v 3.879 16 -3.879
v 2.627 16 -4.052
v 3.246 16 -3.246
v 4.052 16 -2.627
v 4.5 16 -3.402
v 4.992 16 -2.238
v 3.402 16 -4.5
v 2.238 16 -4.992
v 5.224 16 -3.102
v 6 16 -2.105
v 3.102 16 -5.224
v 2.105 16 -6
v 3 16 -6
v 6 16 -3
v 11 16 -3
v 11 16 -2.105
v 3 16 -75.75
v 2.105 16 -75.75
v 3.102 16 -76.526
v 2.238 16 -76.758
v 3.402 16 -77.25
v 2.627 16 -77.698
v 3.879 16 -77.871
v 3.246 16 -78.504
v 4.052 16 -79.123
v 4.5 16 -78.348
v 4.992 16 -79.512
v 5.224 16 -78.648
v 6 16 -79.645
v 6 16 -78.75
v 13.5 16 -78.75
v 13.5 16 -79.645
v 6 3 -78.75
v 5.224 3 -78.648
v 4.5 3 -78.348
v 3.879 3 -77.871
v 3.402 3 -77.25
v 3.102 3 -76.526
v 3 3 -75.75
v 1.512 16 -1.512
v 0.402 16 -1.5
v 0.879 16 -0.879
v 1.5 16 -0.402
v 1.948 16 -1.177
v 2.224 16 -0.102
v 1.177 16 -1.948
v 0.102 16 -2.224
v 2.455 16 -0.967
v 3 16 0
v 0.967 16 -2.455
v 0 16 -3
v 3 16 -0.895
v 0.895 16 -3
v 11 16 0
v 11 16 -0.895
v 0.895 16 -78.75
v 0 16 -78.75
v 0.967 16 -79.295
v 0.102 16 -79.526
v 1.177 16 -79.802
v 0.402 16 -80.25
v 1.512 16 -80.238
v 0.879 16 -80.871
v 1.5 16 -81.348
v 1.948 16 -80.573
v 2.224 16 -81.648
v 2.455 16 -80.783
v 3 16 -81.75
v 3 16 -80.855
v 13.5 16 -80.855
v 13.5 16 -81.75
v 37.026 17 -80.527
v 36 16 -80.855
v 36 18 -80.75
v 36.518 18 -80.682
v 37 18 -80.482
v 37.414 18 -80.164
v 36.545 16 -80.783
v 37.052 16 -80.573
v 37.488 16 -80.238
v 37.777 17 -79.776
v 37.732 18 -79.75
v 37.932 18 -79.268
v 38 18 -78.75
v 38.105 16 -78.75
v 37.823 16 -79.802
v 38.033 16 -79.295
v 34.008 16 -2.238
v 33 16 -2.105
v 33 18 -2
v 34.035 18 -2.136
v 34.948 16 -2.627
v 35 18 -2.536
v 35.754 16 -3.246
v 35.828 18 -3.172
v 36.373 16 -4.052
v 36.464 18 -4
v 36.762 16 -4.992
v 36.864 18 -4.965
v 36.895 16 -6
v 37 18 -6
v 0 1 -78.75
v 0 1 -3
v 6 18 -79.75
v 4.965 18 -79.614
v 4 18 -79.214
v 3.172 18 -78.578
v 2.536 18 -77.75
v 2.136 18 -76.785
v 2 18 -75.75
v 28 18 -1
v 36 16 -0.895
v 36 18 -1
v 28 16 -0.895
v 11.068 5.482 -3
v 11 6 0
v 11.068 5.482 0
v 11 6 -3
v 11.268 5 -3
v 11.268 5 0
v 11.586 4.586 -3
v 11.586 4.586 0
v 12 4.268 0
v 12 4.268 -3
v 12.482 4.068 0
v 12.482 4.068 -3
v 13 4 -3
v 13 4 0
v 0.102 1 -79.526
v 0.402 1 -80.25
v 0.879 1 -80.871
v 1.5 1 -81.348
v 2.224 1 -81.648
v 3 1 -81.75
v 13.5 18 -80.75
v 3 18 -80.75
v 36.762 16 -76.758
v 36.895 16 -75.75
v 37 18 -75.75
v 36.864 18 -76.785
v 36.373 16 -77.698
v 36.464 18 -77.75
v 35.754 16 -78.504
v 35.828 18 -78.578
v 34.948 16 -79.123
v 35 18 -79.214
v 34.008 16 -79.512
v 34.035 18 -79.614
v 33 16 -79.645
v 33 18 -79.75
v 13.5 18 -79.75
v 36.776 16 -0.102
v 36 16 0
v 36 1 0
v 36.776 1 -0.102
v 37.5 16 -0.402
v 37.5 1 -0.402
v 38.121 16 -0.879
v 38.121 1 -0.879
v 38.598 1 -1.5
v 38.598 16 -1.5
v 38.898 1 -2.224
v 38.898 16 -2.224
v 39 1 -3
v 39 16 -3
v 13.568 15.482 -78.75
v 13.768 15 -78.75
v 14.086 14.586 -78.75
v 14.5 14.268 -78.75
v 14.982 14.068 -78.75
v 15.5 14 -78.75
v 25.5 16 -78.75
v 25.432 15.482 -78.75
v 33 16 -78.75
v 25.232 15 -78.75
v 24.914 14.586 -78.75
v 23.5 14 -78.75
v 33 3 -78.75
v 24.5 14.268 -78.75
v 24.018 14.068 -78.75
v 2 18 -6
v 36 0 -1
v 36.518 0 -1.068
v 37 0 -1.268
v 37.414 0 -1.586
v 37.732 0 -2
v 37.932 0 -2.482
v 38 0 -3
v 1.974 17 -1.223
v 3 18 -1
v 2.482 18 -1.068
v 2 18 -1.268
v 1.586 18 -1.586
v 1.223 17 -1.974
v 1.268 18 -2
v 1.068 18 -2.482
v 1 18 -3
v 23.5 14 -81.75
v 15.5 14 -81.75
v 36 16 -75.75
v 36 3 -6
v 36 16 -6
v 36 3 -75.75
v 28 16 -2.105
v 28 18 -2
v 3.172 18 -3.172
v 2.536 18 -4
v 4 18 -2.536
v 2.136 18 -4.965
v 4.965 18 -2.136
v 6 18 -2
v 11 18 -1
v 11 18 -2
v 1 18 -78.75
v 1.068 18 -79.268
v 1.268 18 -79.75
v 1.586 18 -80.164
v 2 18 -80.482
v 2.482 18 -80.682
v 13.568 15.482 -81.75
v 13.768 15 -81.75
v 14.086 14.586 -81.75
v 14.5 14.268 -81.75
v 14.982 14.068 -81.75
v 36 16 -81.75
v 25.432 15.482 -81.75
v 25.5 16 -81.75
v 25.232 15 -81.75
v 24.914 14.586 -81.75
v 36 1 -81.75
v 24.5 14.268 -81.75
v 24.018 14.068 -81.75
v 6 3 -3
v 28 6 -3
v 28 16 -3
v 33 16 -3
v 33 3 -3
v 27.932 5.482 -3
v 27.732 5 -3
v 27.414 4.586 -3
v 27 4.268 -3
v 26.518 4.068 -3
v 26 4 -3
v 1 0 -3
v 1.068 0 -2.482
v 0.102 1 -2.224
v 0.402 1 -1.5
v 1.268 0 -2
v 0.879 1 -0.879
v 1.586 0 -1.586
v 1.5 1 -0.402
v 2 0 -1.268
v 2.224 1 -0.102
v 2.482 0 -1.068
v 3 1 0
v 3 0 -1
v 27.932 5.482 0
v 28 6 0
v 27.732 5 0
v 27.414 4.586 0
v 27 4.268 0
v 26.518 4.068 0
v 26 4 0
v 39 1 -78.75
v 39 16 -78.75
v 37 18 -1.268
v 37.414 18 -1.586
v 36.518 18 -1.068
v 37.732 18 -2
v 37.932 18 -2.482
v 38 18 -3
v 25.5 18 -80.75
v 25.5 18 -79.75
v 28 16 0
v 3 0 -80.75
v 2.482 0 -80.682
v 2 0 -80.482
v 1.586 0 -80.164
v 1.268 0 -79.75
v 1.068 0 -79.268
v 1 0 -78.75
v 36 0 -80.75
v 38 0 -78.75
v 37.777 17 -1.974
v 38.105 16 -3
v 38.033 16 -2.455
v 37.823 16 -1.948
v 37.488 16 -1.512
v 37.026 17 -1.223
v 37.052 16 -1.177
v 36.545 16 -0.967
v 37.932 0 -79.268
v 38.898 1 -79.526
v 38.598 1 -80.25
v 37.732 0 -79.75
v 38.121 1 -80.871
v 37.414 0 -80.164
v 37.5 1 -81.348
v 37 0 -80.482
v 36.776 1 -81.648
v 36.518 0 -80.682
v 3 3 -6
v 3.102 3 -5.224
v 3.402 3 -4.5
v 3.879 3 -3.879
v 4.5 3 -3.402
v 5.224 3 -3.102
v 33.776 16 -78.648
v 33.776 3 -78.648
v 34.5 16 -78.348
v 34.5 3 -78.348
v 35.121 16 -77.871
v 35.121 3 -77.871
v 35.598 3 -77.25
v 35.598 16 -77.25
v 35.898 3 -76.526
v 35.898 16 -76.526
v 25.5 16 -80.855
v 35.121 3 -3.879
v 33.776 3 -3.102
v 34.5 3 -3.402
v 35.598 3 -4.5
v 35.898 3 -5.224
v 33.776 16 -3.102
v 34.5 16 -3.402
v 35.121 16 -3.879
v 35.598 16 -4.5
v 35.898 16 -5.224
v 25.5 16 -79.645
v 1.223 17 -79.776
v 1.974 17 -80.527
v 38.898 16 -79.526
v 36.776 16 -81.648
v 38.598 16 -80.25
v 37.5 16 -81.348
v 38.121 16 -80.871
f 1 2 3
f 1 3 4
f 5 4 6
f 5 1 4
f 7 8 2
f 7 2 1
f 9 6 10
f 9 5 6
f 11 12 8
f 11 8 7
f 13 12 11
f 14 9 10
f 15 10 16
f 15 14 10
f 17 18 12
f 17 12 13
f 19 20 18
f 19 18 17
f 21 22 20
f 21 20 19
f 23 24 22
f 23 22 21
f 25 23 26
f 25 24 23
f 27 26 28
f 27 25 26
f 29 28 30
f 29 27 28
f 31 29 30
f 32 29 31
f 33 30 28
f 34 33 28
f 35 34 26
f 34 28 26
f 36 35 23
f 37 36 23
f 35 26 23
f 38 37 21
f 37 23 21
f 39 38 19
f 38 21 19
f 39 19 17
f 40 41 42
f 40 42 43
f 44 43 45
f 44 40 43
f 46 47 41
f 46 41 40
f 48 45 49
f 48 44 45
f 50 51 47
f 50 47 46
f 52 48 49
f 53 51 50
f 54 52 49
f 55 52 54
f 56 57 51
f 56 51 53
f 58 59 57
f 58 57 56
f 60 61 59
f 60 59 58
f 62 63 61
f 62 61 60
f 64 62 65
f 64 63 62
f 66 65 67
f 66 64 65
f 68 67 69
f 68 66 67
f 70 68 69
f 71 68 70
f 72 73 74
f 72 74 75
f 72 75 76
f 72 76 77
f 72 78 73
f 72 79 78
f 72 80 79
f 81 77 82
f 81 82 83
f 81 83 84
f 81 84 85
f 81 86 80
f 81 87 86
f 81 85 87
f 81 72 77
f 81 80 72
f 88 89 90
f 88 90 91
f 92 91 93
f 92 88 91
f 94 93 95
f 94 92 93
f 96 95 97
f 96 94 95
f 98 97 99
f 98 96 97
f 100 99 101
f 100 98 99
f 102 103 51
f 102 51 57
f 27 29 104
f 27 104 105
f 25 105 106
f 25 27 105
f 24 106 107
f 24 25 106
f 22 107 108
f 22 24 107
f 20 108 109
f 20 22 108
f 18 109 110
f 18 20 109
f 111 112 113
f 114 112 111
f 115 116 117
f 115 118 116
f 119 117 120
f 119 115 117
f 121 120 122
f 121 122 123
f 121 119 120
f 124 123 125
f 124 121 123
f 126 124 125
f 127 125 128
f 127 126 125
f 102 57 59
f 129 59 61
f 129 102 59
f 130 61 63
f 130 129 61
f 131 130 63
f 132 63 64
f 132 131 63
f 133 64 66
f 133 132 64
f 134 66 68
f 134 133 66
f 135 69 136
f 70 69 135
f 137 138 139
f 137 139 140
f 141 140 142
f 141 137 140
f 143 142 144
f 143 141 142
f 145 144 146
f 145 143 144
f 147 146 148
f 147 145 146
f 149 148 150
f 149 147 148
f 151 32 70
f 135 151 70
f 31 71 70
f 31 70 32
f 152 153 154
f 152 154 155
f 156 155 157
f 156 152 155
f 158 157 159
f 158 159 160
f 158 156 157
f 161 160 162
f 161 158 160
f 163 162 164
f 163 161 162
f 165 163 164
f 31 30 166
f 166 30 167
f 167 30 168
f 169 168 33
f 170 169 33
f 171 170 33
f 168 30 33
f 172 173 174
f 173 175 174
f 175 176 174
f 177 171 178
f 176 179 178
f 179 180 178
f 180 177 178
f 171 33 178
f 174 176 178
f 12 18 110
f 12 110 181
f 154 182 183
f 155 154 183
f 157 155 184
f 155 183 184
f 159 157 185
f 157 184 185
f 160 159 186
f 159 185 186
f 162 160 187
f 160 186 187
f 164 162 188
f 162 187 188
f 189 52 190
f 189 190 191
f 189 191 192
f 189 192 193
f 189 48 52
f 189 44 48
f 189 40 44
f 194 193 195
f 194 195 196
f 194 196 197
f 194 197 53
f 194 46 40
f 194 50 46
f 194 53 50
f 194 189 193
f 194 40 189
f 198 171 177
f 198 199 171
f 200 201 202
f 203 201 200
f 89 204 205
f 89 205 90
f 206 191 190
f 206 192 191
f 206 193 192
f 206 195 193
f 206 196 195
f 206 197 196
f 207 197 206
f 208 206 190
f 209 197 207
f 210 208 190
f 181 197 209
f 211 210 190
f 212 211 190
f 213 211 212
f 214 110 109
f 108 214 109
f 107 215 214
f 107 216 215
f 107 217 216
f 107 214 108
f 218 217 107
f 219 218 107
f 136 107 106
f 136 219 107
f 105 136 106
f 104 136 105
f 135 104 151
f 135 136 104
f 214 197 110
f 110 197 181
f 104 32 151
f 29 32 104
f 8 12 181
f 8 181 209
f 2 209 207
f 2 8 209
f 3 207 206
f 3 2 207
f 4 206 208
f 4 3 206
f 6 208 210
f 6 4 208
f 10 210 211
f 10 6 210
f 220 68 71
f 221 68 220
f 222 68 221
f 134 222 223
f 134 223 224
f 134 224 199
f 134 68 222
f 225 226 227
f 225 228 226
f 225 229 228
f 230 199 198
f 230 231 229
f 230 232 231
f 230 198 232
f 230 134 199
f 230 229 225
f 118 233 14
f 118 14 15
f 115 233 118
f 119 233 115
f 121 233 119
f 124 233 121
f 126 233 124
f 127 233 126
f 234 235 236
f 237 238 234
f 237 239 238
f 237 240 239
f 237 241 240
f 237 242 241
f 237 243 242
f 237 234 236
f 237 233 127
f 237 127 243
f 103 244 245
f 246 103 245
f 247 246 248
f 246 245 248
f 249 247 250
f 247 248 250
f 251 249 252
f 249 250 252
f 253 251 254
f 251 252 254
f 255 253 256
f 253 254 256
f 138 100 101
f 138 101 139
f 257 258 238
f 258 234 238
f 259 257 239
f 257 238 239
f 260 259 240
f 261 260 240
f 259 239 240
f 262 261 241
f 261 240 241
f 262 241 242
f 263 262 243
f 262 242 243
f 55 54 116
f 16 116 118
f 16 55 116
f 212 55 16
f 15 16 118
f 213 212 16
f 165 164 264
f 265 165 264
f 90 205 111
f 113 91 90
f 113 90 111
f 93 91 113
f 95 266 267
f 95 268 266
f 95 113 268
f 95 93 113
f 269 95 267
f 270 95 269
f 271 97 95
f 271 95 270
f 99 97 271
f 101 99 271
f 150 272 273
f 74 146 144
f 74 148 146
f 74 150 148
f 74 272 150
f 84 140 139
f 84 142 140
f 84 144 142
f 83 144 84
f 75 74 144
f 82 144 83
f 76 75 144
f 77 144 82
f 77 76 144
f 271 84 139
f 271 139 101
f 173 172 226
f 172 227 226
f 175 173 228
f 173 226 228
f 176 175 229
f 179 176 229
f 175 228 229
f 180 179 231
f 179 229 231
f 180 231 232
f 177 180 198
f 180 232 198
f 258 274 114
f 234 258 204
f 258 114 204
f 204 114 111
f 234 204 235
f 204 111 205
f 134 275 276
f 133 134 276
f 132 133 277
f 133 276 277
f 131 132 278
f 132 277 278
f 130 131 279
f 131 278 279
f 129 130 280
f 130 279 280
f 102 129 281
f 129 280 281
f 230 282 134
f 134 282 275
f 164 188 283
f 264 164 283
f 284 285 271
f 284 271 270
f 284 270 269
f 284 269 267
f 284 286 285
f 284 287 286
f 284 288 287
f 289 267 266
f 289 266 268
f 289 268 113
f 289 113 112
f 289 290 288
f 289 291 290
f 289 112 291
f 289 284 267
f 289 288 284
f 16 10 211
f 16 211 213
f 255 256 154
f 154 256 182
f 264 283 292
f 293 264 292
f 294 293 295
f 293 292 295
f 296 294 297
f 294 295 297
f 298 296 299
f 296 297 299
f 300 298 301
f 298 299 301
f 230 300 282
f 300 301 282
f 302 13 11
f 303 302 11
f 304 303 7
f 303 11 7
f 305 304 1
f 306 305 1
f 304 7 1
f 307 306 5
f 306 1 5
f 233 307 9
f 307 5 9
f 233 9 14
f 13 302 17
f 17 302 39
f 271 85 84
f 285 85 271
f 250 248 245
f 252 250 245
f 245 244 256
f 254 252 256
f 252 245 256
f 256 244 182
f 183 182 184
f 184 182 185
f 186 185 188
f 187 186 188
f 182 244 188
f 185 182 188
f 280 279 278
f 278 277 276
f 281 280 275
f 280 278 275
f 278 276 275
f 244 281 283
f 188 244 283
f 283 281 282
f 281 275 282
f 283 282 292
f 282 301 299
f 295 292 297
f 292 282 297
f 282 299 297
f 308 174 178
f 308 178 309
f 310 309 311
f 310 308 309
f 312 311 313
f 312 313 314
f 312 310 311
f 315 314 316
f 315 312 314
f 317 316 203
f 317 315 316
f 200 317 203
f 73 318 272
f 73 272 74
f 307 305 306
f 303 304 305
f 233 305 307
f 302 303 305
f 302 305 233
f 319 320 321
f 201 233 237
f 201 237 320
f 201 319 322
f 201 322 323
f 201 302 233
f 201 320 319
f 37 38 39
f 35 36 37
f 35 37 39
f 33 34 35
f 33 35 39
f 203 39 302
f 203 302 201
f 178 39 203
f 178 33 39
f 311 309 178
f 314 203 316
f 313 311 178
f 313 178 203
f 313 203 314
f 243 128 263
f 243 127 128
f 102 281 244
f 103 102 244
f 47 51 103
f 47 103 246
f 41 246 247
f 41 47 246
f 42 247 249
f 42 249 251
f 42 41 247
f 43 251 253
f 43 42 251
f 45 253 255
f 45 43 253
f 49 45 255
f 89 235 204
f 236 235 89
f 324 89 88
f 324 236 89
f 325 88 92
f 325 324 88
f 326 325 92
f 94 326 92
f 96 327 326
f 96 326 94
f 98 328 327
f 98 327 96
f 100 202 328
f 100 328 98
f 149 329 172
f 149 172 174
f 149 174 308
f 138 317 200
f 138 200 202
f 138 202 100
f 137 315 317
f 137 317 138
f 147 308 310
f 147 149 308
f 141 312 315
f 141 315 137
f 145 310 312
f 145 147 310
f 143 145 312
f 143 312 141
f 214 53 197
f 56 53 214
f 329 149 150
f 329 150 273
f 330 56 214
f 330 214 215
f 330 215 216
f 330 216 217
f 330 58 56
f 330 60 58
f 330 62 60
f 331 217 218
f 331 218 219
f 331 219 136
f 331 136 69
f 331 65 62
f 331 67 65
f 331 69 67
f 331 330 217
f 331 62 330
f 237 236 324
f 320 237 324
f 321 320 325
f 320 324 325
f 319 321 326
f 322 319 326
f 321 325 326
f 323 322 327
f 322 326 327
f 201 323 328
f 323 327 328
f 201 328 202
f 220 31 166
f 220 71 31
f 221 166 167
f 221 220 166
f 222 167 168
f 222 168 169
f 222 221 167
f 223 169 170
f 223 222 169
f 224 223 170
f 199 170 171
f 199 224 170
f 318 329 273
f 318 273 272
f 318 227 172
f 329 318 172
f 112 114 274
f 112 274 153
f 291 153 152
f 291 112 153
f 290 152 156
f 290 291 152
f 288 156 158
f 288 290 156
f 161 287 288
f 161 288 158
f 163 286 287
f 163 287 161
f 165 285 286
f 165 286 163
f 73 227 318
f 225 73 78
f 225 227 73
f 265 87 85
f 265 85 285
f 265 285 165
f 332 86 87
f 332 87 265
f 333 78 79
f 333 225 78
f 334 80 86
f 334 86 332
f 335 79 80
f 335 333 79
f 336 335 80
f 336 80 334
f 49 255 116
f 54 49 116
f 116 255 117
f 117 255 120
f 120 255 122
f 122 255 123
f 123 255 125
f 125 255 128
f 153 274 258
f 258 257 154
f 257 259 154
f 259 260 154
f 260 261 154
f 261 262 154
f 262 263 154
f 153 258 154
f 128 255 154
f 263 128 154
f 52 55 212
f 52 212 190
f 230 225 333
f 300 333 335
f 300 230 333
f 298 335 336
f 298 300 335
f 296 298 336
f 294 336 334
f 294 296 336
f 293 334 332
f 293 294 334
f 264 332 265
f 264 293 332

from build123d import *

# Parameters (mm, degrees)
SKETCH1_W                 = 39
SKETCH1_H                 = 81.75
BOSS_EXTRUDE1_DEPTH       = 3
SKETCH2_W                 = 39
SKETCH2_H                 = 81.75
SKETCH2_W_2               = 33
SKETCH2_H_2               = 75.75
BOSS_EXTRUDE2_DEPTH       = 15
SKETCH4_W                 = 17
SKETCH4_H                 = 3
CUT_EXTRUDE1_DEPTH        = 14
SKETCH4_3_W               = 12
SKETCH4_3_H               = 3
CUT_EXTRUDE2_DEPTH        = 4
FILLET1_R                 = 3
STANDOFFS1_GROOVE_DEPTH   = 2
STANDOFFS1_GROOVE_DRAFT   = -3
STANDOFFS1_GROOVE_2_DEPTH = 2
STANDOFFS1_GROOVE_2_DRAFT = -3
STANDOFFS2_GROOVE_DEPTH   = 2
STANDOFFS2_GROOVE_DRAFT   = -3
STANDOFFS2_GROOVE_2_DEPTH = 2
STANDOFFS2_GROOVE_2_DRAFT = -3
FILLET2_R                 = 2
CHAMFER1_SIZE             = 1


# Read off the part's stored shape, not the designer's step: Standoffs1-Groove, Standoffs2-Groove
with BuildPart() as part:
    # Sketch1 → Boss-Extrude1 (new body)
    with BuildSketch(Plane(origin=(0, 0, 0), x_dir=(1, 0, 0), z_dir=(0, 1, 0))):
        with Locations((19.5, 40.875)):
            Rectangle(SKETCH1_W, SKETCH1_H)
    extrude(amount=BOSS_EXTRUDE1_DEPTH)

    # Sketch2 → Boss-Extrude2 (add)
    with BuildSketch(Plane(origin=(0, 3, 0), x_dir=(1, 0, 0), z_dir=(0, 1, 0))):
        with Locations((19.5, 40.875)):
            Rectangle(SKETCH2_W, SKETCH2_H)
        with Locations((19.5, 40.875)):
            Rectangle(SKETCH2_W_2, SKETCH2_H_2, mode=Mode.SUBTRACT)
    extrude(amount=BOSS_EXTRUDE2_DEPTH)

    # Sketch4 → Cut-Extrude1 (cut)
    with BuildSketch(Plane(origin=(0, 18, 0), x_dir=(1, 0, 0), z_dir=(0, 1, 0))):
        with Locations((19.5, 1.5)):
            Rectangle(SKETCH4_W, SKETCH4_H)
    extrude(amount=-CUT_EXTRUDE1_DEPTH, mode=Mode.SUBTRACT)

    # Sketch4<3> → Cut-Extrude2 (cut)
    with BuildSketch(Plane(origin=(0, 18, 0), x_dir=(1, 0, 0), z_dir=(0, 1, 0))):
        with Locations((19.5, 80.25)):
            Rectangle(SKETCH4_3_W, SKETCH4_3_H)
    extrude(amount=-CUT_EXTRUDE2_DEPTH, mode=Mode.SUBTRACT)

    # Fillet1
    fillet1_edges = [part.edges().sort_by_distance(p)[0] for p in [
        (3, 10.5, -78.75),
        (3, 10.5, -3),
        (36, 10.5, -3),
        (36, 10.5, -78.75),
        (0, 9, -81.75),
        (39, 9, -81.75),
        (39, 9, 0),
        (0, 9, 0),
    ]]
    fillet(fillet1_edges, radius=FILLET1_R)


with BuildPart() as standoffs1_groove_tool:
    # Standoffs1-Groove outline → Standoffs1-Groove (with draft: the straight prism first)
    with BuildSketch(Plane(origin=(0, 16, 0), x_dir=(1, 0, 0), z_dir=(0, 1, 0))):
        with BuildLine():
            Line((11, 0.895184441), (3, 0.895184441))
            ThreePointArc((3, 0.895184441), (1.511670645, 1.511670645), (0.895184441, 3))
            Line((0.895184441, 3), (0.895184441, 78.75))
            ThreePointArc((0.895184441, 78.75), (1.511670645, 80.238329355), (3, 80.854815559))
            Line((3, 80.854815559), (13.5, 80.854815559))
            Line((13.5, 80.854815559), (13.5, 81.75))
            Line((13.5, 81.75), (3, 81.75))
            ThreePointArc((3, 81.75), (0.878679656, 80.871320344), (0, 78.75))
            Line((0, 78.75), (0, 3))
            ThreePointArc((0, 3), (0.878679656, 0.878679656), (3, 0))
            Line((3, 0), (11, 0))
            Line((11, 0), (11, 0.895184441))
        make_face()
    extrude(amount=STANDOFFS1_GROOVE_DEPTH)
    # Standoffs1-Groove: the draft: its side faces are tilted about the plane it starts from
    standoffs1_groove_sides = [standoffs1_groove_tool.faces().sort_by_distance(p)[0] for p in [
        (7, 17, -0.895184441),
        (1.511670645, 17, -1.511670645),
        (0.895184441, 17, -40.875),
        (1.511670645, 17, -80.238329355),
        (8.25, 17, -80.854815559),
        (13.5, 17, -81.30240778),
        (8.25, 17, -81.75),
        (0.878679656, 17, -80.871320344),
        (0, 17, -40.875),
        (0.878679656, 17, -0.878679656),
        (7, 17, 0),
        (11, 17, -0.447592221),
    ]]
    draft(standoffs1_groove_sides, Plane(origin=(0, 16, 0), x_dir=(1, 0, 0), z_dir=(0, 1, 0)), STANDOFFS1_GROOVE_DRAFT)


with BuildPart() as part_1:
    add(part.part)

    # Standoffs1-Groove: cut by standoffs1_groove_tool
    add(standoffs1_groove_tool.part, mode=Mode.SUBTRACT)


with BuildPart() as standoffs1_groove_2_tool:
    # Standoffs1-Groove 2 outline → Standoffs1-Groove 2 (with draft: the straight prism first)
    with BuildSketch(Plane(origin=(0, 16, 0), x_dir=(1, 0, 0), z_dir=(0, 1, 0))):
        with BuildLine():
            Line((11, 3), (6, 3))
            ThreePointArc((6, 3), (3.878679656, 3.878679656), (3, 6))
            Line((3, 6), (3, 75.75))
            ThreePointArc((3, 75.75), (3.878679656, 77.871320344), (6, 78.75))
            Line((6, 78.75), (13.5, 78.75))
            Line((13.5, 78.75), (13.5, 79.645184441))
            Line((13.5, 79.645184441), (6, 79.645184441))
            ThreePointArc((6, 79.645184441), (3.245688667, 78.504311333), (2.104815559, 75.75))
            Line((2.104815559, 75.75), (2.104815559, 6))
            ThreePointArc((2.104815559, 6), (3.245688667, 3.245688667), (6, 2.104815559))
            Line((6, 2.104815559), (11, 2.104815559))
            Line((11, 2.104815559), (11, 3))
        make_face()
    extrude(amount=STANDOFFS1_GROOVE_2_DEPTH)
    # Standoffs1-Groove 2: the draft: its side faces are tilted about the plane it starts from
    standoffs1_groove_2_sides = [standoffs1_groove_2_tool.faces().sort_by_distance(p)[0] for p in [
        (3.245688667, 17, -78.504311333),
        (2.104815559, 17, -40.875),
        (3.245688667, 17, -3.245688667),
        (8.5, 17, -2.104815559),
        (11, 17, -2.552407779),
        (8.5, 17, -3),
        (3.878679656, 17, -3.878679656),
        (3, 17, -40.875),
        (3.878679656, 17, -77.871320344),
        (9.75, 17, -78.75),
        (13.5, 17, -79.19759222),
        (9.75, 17, -79.645184441),
    ]]
    draft(standoffs1_groove_2_sides, Plane(origin=(0, 16, 0), x_dir=(1, 0, 0), z_dir=(0, 1, 0)), STANDOFFS1_GROOVE_2_DRAFT)


with BuildPart() as part_2:
    add(part_1.part)

    # Standoffs1-Groove 2: cut by standoffs1_groove_2_tool
    add(standoffs1_groove_2_tool.part, mode=Mode.SUBTRACT)


with BuildPart() as standoffs2_groove_tool:
    # Standoffs2-Groove outline → Standoffs2-Groove (with draft: the straight prism first)
    with BuildSketch(Plane(origin=(0, 16, 0), x_dir=(1, 0, 0), z_dir=(0, 1, 0))):
        with BuildLine():
            Line((25.5, 81.75), (25.5, 80.854815559))
            Line((25.5, 80.854815559), (36, 80.854815559))
            ThreePointArc((36, 80.854815559), (37.488329355, 80.238329355), (38.104815559, 78.75))
            Line((38.104815559, 78.75), (38.104815559, 3))
            ThreePointArc((38.104815559, 3), (37.488329355, 1.511670645), (36, 0.895184441))
            Line((36, 0.895184441), (28, 0.895184441))
            Line((28, 0.895184441), (28, 0))
            Line((28, 0), (36, 0))
            ThreePointArc((36, 0), (38.121320344, 0.878679656), (39, 3))
            Line((39, 3), (39, 78.75))
            ThreePointArc((39, 78.75), (38.121320344, 80.871320344), (36, 81.75))
            Line((36, 81.75), (25.5, 81.75))
        make_face()
    extrude(amount=STANDOFFS2_GROOVE_DEPTH)
    # Standoffs2-Groove: the draft: its side faces are tilted about the plane it starts from
    standoffs2_groove_sides = [standoffs2_groove_tool.faces().sort_by_distance(p)[0] for p in [
        (25.5, 17, -81.30240778),
        (30.75, 17, -80.854815559),
        (37.488329355, 17, -80.238329355),
        (38.104815559, 17, -40.875),
        (37.488329355, 17, -1.511670645),
        (32, 17, -0.895184441),
        (28, 17, -0.447592221),
        (32, 17, 0),
        (38.121320344, 17, -0.878679656),
        (39, 17, -40.875),
        (38.121320344, 17, -80.871320344),
        (30.75, 17, -81.75),
    ]]
    draft(standoffs2_groove_sides, Plane(origin=(0, 16, 0), x_dir=(1, 0, 0), z_dir=(0, 1, 0)), STANDOFFS2_GROOVE_DRAFT)


with BuildPart() as part_3:
    add(part_2.part)

    # Standoffs2-Groove: cut by standoffs2_groove_tool
    add(standoffs2_groove_tool.part, mode=Mode.SUBTRACT)


with BuildPart() as standoffs2_groove_2_tool:
    # Standoffs2-Groove 2 outline → Standoffs2-Groove 2 (with draft: the straight prism first)
    with BuildSketch(Plane(origin=(0, 16, 0), x_dir=(1, 0, 0), z_dir=(0, 1, 0))):
        with BuildLine():
            Line((28, 3), (28, 2.104815559))
            Line((28, 2.104815559), (33, 2.104815559))
            ThreePointArc((33, 2.104815559), (35.754311333, 3.245688667), (36.895184441, 6))
            Line((36.895184441, 6), (36.895184441, 75.75))
            ThreePointArc((36.895184441, 75.75), (35.754311333, 78.504311333), (33, 79.645184441))
            Line((33, 79.645184441), (25.5, 79.645184441))
            Line((25.5, 79.645184441), (25.5, 78.75))
            Line((25.5, 78.75), (33, 78.75))
            ThreePointArc((33, 78.75), (35.121320344, 77.871320344), (36, 75.75))
            Line((36, 75.75), (36, 6))
            ThreePointArc((36, 6), (35.121320344, 3.878679656), (33, 3))
            Line((33, 3), (28, 3))
        make_face()
    extrude(amount=STANDOFFS2_GROOVE_2_DEPTH)
    # Standoffs2-Groove 2: the draft: its side faces are tilted about the plane it starts from
    standoffs2_groove_2_sides = [standoffs2_groove_2_tool.faces().sort_by_distance(p)[0] for p in [
        (30.5, 17, -3),
        (28, 17, -2.552407779),
        (30.5, 17, -2.104815559),
        (35.754311333, 17, -3.245688667),
        (36.895184441, 17, -40.875),
        (35.754311333, 17, -78.504311333),
        (29.25, 17, -79.645184441),
        (25.5, 17, -79.19759222),
        (29.25, 17, -78.75),
        (35.121320344, 17, -77.871320344),
        (36, 17, -40.875),
        (35.121320344, 17, -3.878679656),
    ]]
    draft(standoffs2_groove_2_sides, Plane(origin=(0, 16, 0), x_dir=(1, 0, 0), z_dir=(0, 1, 0)), STANDOFFS2_GROOVE_2_DRAFT)


with BuildPart() as part_4:
    add(part_3.part)

    # Standoffs2-Groove 2: cut by standoffs2_groove_2_tool
    add(standoffs2_groove_2_tool.part, mode=Mode.SUBTRACT)

    # Fillet2
    fillet2_edges = [part_4.edges().sort_by_distance(p)[0] for p in [
        (25.5, 14, -80.25),
        (13.5, 14, -80.25),
        (11, 4, -1.5),
        (28, 4, -1.5),
    ]]
    fillet(fillet2_edges, radius=FILLET2_R - 0.0001)  # a hair under: the kernel refuses the full size

    # Chamfer1
    chamfer1_edges = [part_4.edges().sort_by_distance(p)[0] for p in [
        (19.5, 0, 0),
        (0, 0, -40.875),
        (19.5, 0, -81.75),
        (39, 0, -40.875),
        (38.121320344, 0, -0.878679656),
        (0.878679656, 0, -80.871320344),
        (38.121320344, 0, -80.871320344),
        (0.878679656, 0, -0.878679656),
    ]]
    chamfer(chamfer1_edges, length=CHAMFER1_SIZE)


solid = part_4.part
